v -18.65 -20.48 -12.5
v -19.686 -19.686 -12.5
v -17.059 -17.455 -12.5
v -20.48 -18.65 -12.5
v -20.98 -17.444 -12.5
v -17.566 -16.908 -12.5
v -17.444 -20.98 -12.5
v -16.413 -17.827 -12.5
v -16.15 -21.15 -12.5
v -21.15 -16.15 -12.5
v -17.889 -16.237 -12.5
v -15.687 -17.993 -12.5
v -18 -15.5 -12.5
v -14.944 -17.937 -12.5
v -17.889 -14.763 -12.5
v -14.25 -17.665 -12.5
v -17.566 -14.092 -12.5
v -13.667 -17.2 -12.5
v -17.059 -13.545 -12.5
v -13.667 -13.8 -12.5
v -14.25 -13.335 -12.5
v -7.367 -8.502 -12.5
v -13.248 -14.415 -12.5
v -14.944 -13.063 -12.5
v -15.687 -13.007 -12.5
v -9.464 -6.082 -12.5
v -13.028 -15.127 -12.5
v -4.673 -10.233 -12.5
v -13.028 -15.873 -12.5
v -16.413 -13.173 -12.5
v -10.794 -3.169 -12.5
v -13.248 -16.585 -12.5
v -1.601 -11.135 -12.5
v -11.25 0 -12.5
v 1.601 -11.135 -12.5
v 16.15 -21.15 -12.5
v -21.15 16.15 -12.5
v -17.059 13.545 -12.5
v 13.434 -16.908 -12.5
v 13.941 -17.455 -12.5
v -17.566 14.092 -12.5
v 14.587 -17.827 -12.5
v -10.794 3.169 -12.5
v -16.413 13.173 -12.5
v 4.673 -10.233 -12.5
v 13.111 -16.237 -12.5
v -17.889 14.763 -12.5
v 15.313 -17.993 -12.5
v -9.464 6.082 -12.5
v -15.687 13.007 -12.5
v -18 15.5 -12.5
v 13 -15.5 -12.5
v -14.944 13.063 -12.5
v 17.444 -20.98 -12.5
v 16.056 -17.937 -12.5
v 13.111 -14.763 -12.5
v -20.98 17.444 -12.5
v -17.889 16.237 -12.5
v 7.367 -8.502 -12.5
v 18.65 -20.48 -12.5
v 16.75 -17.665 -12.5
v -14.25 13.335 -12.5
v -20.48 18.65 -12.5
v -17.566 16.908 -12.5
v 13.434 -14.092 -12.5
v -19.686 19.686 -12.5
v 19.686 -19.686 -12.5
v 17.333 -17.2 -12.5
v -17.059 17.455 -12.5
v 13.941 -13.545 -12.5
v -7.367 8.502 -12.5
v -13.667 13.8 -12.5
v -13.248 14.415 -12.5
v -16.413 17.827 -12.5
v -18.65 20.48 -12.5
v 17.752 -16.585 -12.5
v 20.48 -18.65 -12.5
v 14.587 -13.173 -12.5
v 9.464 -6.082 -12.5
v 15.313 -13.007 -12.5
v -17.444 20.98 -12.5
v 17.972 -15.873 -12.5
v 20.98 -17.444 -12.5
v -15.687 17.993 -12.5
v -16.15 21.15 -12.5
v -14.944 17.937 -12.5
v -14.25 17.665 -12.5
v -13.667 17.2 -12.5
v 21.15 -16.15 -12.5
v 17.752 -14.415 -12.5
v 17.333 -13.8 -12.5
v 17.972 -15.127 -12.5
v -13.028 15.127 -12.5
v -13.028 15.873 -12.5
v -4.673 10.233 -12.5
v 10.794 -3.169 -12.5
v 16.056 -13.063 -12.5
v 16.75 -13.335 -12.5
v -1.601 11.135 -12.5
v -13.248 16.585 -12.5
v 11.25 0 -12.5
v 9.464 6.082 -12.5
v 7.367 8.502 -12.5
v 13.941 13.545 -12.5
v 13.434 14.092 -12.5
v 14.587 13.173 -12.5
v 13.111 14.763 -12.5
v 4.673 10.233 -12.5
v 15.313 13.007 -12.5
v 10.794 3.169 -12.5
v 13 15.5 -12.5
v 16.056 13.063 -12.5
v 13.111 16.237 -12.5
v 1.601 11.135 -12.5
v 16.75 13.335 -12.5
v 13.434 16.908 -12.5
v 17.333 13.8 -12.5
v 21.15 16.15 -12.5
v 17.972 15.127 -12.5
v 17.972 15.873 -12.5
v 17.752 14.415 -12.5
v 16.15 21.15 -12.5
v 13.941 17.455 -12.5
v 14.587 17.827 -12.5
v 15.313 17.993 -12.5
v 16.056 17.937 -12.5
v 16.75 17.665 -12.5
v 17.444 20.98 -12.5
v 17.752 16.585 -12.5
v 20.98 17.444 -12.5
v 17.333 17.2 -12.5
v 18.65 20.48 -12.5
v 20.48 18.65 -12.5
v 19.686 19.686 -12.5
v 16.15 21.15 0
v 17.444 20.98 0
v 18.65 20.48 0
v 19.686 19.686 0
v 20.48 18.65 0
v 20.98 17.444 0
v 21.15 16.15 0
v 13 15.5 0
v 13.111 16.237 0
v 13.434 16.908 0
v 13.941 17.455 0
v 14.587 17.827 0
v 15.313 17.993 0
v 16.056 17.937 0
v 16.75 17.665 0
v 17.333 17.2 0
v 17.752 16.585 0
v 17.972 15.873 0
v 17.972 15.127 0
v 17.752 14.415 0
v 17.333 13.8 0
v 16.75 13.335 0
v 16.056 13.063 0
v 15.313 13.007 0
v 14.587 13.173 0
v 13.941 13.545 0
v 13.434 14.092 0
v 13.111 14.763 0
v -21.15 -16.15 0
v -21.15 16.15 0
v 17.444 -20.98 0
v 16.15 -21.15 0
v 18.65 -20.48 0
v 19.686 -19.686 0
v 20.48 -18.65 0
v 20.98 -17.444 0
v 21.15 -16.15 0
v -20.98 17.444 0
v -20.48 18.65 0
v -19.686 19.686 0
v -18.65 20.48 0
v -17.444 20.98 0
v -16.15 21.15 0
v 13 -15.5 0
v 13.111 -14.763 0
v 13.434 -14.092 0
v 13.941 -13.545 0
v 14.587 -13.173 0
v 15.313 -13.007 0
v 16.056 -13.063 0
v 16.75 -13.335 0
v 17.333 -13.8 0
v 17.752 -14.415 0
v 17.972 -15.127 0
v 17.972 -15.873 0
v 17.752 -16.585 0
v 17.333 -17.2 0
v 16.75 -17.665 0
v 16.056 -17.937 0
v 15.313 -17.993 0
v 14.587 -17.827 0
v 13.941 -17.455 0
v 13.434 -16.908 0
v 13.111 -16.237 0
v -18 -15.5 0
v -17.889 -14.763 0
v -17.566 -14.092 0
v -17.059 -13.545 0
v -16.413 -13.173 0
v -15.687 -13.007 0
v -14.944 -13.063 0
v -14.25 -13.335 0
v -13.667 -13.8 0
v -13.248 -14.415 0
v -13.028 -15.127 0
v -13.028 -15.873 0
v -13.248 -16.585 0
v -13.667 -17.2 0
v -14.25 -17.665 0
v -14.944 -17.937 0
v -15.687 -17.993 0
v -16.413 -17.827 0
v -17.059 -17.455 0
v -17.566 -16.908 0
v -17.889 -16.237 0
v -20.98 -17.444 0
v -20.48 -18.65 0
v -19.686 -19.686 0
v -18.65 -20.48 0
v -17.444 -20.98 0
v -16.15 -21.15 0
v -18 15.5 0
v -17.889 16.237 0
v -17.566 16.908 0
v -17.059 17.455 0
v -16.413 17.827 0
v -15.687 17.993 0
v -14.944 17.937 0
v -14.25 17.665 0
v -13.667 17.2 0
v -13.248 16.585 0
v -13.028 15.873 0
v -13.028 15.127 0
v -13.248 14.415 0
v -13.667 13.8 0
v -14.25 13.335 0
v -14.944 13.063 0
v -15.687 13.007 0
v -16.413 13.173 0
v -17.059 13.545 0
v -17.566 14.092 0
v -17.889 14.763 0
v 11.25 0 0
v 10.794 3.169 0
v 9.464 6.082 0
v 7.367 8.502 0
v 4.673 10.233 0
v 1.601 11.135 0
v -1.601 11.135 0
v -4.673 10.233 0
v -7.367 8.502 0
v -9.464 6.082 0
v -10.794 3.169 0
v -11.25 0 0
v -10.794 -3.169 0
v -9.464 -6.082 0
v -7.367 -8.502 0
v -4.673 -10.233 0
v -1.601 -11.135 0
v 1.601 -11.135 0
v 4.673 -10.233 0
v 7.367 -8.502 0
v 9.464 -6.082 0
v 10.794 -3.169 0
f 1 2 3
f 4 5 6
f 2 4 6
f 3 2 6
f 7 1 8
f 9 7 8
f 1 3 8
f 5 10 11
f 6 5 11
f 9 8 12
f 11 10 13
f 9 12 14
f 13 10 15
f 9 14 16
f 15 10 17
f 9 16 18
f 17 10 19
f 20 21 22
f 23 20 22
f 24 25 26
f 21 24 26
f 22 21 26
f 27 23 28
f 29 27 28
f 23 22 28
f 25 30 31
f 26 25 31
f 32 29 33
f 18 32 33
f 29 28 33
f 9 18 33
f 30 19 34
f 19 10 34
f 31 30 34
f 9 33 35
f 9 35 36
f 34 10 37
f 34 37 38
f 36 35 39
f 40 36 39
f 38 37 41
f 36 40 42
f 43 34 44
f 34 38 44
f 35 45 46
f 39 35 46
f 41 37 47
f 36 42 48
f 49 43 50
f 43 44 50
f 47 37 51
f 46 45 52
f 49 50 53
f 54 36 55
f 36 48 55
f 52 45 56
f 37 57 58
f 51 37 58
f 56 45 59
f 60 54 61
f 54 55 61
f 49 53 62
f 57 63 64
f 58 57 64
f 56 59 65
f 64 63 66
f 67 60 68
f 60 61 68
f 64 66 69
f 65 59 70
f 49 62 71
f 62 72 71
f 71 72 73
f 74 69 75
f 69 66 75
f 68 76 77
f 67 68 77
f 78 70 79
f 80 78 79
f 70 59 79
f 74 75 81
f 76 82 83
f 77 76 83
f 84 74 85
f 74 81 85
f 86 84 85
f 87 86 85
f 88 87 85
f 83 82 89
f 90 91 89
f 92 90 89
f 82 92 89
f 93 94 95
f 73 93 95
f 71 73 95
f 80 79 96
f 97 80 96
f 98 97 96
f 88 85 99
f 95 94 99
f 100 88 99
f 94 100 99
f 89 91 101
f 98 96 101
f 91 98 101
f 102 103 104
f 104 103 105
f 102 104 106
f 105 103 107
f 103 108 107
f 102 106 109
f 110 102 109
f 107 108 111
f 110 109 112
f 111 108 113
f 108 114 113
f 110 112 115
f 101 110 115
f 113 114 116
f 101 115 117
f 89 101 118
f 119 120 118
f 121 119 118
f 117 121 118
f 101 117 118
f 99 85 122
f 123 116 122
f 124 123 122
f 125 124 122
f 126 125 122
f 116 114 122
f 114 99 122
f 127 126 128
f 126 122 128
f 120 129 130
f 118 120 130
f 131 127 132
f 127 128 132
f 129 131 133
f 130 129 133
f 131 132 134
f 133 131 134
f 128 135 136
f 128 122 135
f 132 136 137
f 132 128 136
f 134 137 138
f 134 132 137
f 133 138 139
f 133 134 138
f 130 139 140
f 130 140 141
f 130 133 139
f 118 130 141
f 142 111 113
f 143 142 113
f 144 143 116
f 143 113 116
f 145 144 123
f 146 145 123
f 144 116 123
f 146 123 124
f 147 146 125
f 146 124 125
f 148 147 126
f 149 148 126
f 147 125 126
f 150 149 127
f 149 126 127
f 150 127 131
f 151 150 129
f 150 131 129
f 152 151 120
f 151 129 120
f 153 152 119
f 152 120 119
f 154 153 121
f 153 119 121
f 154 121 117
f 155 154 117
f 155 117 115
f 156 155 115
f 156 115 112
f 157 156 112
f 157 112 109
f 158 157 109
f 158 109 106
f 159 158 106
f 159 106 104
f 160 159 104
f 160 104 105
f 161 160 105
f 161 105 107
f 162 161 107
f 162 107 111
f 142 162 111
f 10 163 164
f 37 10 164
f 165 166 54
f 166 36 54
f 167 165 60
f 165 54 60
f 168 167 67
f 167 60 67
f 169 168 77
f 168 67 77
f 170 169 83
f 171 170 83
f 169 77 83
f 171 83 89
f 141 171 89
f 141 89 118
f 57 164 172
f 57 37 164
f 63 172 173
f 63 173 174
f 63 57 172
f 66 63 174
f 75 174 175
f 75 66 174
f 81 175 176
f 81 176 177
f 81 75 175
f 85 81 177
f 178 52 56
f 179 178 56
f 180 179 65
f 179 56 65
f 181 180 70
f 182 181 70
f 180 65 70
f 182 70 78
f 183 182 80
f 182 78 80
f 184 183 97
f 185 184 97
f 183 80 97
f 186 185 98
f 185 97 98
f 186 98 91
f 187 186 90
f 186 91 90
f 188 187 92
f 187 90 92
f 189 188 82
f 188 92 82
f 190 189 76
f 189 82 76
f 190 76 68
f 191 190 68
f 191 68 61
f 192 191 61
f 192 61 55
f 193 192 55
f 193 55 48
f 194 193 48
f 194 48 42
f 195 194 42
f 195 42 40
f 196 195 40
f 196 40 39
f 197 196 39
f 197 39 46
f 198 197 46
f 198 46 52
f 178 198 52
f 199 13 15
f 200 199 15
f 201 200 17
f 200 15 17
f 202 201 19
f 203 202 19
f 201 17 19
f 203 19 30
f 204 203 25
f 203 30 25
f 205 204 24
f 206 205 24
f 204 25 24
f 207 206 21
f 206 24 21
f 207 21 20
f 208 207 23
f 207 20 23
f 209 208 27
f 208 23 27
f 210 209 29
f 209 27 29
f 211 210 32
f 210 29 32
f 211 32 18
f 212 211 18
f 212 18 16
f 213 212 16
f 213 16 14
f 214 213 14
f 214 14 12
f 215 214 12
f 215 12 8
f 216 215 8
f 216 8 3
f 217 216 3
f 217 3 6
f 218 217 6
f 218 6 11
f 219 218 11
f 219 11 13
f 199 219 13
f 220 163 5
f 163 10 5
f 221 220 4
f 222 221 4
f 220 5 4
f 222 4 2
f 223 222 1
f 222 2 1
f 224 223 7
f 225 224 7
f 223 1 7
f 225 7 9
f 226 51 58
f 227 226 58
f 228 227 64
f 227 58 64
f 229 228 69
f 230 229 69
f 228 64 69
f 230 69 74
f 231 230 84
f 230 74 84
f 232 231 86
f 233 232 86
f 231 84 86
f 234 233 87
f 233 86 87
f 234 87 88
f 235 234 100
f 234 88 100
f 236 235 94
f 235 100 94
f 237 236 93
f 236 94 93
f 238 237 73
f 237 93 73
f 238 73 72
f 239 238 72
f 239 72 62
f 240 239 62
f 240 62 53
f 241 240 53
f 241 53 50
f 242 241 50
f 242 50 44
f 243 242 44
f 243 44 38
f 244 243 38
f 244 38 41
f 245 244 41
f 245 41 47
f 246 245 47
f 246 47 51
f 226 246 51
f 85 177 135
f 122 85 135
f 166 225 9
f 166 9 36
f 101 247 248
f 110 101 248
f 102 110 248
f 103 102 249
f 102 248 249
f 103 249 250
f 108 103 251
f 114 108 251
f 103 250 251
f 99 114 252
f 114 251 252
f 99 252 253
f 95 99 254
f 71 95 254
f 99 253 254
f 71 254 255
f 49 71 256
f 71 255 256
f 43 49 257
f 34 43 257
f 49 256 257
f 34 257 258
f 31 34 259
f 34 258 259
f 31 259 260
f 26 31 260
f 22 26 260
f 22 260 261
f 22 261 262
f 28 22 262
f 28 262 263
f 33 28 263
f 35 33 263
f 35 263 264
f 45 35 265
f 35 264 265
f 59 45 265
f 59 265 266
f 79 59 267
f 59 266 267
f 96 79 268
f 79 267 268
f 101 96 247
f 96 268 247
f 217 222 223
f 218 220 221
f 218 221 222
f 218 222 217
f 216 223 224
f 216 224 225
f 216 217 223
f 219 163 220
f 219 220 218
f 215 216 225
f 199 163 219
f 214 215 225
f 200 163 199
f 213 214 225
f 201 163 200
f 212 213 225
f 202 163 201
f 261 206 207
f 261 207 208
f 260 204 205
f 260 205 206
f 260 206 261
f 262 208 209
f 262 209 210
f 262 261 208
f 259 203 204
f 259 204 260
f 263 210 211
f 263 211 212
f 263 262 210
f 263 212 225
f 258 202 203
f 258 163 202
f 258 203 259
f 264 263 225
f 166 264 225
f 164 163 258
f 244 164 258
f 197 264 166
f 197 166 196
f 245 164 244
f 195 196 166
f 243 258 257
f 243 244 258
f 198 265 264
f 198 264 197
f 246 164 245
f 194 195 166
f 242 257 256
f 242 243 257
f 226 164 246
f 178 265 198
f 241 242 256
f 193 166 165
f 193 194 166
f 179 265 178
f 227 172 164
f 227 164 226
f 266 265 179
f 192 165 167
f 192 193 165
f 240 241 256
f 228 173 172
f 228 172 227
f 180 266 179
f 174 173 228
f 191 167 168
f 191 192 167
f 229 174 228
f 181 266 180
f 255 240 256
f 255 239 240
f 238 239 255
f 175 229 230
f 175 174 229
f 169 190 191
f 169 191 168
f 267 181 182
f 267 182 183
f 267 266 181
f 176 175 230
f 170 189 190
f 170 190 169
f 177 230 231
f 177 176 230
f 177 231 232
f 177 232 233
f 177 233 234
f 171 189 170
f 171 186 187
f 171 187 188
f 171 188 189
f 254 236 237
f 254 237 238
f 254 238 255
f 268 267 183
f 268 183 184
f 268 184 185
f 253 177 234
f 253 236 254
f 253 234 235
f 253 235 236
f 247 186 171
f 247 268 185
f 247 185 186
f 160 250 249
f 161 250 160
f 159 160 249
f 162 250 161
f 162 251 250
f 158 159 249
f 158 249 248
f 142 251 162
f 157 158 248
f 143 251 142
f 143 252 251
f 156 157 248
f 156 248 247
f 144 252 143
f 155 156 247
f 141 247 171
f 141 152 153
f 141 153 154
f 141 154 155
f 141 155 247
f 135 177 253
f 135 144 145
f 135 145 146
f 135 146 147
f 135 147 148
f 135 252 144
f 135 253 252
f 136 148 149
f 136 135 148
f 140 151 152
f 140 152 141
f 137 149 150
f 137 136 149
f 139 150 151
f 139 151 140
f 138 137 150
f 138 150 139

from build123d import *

# Parameters (mm, degrees)
F0_W     = 42.3
F0_H     = 42.3
F0_W_2   = 31
F0_H_2   = 31
F0_R     = 11.25
F1_DEPTH = 12.5
F2_R     = 5
F3_R     = 5
F4_D     = 5


with BuildPart() as f1:
    # F0 (on Top) → F1 (new body)
    with BuildSketch(Plane.XY):
        Rectangle(F0_W, F0_H)
        Rectangle(F0_W_2, F0_H_2, mode=Mode.SUBTRACT)
        Rectangle(F0_W_2, F0_H_2)
        Circle(F0_R, mode=Mode.SUBTRACT)
    extrude(amount=-F1_DEPTH)

    # F2
    f2_edges = [f1.edges().sort_by_distance(p)[0] for p in [
        (21.15, -21.15, -6.25),
        (-21.15, 21.15, -6.25),
        (21.15, 21.15, -6.25),
    ]]
    fillet(f2_edges, radius=F2_R)

    # F3
    f3_edges = [f1.edges().sort_by_distance(p)[0] for p in [
        (-21.15, -21.15, -6.25),
    ]]
    fillet(f3_edges, radius=F3_R)

    # F4 (through all)
    with Locations(Plane.XY):
        with Locations((-15.5, -15.5), (-15.5, 15.5), (15.5, 15.5), (15.5, -15.5)):
            Hole(F4_D / 2)


solid = f1.part
